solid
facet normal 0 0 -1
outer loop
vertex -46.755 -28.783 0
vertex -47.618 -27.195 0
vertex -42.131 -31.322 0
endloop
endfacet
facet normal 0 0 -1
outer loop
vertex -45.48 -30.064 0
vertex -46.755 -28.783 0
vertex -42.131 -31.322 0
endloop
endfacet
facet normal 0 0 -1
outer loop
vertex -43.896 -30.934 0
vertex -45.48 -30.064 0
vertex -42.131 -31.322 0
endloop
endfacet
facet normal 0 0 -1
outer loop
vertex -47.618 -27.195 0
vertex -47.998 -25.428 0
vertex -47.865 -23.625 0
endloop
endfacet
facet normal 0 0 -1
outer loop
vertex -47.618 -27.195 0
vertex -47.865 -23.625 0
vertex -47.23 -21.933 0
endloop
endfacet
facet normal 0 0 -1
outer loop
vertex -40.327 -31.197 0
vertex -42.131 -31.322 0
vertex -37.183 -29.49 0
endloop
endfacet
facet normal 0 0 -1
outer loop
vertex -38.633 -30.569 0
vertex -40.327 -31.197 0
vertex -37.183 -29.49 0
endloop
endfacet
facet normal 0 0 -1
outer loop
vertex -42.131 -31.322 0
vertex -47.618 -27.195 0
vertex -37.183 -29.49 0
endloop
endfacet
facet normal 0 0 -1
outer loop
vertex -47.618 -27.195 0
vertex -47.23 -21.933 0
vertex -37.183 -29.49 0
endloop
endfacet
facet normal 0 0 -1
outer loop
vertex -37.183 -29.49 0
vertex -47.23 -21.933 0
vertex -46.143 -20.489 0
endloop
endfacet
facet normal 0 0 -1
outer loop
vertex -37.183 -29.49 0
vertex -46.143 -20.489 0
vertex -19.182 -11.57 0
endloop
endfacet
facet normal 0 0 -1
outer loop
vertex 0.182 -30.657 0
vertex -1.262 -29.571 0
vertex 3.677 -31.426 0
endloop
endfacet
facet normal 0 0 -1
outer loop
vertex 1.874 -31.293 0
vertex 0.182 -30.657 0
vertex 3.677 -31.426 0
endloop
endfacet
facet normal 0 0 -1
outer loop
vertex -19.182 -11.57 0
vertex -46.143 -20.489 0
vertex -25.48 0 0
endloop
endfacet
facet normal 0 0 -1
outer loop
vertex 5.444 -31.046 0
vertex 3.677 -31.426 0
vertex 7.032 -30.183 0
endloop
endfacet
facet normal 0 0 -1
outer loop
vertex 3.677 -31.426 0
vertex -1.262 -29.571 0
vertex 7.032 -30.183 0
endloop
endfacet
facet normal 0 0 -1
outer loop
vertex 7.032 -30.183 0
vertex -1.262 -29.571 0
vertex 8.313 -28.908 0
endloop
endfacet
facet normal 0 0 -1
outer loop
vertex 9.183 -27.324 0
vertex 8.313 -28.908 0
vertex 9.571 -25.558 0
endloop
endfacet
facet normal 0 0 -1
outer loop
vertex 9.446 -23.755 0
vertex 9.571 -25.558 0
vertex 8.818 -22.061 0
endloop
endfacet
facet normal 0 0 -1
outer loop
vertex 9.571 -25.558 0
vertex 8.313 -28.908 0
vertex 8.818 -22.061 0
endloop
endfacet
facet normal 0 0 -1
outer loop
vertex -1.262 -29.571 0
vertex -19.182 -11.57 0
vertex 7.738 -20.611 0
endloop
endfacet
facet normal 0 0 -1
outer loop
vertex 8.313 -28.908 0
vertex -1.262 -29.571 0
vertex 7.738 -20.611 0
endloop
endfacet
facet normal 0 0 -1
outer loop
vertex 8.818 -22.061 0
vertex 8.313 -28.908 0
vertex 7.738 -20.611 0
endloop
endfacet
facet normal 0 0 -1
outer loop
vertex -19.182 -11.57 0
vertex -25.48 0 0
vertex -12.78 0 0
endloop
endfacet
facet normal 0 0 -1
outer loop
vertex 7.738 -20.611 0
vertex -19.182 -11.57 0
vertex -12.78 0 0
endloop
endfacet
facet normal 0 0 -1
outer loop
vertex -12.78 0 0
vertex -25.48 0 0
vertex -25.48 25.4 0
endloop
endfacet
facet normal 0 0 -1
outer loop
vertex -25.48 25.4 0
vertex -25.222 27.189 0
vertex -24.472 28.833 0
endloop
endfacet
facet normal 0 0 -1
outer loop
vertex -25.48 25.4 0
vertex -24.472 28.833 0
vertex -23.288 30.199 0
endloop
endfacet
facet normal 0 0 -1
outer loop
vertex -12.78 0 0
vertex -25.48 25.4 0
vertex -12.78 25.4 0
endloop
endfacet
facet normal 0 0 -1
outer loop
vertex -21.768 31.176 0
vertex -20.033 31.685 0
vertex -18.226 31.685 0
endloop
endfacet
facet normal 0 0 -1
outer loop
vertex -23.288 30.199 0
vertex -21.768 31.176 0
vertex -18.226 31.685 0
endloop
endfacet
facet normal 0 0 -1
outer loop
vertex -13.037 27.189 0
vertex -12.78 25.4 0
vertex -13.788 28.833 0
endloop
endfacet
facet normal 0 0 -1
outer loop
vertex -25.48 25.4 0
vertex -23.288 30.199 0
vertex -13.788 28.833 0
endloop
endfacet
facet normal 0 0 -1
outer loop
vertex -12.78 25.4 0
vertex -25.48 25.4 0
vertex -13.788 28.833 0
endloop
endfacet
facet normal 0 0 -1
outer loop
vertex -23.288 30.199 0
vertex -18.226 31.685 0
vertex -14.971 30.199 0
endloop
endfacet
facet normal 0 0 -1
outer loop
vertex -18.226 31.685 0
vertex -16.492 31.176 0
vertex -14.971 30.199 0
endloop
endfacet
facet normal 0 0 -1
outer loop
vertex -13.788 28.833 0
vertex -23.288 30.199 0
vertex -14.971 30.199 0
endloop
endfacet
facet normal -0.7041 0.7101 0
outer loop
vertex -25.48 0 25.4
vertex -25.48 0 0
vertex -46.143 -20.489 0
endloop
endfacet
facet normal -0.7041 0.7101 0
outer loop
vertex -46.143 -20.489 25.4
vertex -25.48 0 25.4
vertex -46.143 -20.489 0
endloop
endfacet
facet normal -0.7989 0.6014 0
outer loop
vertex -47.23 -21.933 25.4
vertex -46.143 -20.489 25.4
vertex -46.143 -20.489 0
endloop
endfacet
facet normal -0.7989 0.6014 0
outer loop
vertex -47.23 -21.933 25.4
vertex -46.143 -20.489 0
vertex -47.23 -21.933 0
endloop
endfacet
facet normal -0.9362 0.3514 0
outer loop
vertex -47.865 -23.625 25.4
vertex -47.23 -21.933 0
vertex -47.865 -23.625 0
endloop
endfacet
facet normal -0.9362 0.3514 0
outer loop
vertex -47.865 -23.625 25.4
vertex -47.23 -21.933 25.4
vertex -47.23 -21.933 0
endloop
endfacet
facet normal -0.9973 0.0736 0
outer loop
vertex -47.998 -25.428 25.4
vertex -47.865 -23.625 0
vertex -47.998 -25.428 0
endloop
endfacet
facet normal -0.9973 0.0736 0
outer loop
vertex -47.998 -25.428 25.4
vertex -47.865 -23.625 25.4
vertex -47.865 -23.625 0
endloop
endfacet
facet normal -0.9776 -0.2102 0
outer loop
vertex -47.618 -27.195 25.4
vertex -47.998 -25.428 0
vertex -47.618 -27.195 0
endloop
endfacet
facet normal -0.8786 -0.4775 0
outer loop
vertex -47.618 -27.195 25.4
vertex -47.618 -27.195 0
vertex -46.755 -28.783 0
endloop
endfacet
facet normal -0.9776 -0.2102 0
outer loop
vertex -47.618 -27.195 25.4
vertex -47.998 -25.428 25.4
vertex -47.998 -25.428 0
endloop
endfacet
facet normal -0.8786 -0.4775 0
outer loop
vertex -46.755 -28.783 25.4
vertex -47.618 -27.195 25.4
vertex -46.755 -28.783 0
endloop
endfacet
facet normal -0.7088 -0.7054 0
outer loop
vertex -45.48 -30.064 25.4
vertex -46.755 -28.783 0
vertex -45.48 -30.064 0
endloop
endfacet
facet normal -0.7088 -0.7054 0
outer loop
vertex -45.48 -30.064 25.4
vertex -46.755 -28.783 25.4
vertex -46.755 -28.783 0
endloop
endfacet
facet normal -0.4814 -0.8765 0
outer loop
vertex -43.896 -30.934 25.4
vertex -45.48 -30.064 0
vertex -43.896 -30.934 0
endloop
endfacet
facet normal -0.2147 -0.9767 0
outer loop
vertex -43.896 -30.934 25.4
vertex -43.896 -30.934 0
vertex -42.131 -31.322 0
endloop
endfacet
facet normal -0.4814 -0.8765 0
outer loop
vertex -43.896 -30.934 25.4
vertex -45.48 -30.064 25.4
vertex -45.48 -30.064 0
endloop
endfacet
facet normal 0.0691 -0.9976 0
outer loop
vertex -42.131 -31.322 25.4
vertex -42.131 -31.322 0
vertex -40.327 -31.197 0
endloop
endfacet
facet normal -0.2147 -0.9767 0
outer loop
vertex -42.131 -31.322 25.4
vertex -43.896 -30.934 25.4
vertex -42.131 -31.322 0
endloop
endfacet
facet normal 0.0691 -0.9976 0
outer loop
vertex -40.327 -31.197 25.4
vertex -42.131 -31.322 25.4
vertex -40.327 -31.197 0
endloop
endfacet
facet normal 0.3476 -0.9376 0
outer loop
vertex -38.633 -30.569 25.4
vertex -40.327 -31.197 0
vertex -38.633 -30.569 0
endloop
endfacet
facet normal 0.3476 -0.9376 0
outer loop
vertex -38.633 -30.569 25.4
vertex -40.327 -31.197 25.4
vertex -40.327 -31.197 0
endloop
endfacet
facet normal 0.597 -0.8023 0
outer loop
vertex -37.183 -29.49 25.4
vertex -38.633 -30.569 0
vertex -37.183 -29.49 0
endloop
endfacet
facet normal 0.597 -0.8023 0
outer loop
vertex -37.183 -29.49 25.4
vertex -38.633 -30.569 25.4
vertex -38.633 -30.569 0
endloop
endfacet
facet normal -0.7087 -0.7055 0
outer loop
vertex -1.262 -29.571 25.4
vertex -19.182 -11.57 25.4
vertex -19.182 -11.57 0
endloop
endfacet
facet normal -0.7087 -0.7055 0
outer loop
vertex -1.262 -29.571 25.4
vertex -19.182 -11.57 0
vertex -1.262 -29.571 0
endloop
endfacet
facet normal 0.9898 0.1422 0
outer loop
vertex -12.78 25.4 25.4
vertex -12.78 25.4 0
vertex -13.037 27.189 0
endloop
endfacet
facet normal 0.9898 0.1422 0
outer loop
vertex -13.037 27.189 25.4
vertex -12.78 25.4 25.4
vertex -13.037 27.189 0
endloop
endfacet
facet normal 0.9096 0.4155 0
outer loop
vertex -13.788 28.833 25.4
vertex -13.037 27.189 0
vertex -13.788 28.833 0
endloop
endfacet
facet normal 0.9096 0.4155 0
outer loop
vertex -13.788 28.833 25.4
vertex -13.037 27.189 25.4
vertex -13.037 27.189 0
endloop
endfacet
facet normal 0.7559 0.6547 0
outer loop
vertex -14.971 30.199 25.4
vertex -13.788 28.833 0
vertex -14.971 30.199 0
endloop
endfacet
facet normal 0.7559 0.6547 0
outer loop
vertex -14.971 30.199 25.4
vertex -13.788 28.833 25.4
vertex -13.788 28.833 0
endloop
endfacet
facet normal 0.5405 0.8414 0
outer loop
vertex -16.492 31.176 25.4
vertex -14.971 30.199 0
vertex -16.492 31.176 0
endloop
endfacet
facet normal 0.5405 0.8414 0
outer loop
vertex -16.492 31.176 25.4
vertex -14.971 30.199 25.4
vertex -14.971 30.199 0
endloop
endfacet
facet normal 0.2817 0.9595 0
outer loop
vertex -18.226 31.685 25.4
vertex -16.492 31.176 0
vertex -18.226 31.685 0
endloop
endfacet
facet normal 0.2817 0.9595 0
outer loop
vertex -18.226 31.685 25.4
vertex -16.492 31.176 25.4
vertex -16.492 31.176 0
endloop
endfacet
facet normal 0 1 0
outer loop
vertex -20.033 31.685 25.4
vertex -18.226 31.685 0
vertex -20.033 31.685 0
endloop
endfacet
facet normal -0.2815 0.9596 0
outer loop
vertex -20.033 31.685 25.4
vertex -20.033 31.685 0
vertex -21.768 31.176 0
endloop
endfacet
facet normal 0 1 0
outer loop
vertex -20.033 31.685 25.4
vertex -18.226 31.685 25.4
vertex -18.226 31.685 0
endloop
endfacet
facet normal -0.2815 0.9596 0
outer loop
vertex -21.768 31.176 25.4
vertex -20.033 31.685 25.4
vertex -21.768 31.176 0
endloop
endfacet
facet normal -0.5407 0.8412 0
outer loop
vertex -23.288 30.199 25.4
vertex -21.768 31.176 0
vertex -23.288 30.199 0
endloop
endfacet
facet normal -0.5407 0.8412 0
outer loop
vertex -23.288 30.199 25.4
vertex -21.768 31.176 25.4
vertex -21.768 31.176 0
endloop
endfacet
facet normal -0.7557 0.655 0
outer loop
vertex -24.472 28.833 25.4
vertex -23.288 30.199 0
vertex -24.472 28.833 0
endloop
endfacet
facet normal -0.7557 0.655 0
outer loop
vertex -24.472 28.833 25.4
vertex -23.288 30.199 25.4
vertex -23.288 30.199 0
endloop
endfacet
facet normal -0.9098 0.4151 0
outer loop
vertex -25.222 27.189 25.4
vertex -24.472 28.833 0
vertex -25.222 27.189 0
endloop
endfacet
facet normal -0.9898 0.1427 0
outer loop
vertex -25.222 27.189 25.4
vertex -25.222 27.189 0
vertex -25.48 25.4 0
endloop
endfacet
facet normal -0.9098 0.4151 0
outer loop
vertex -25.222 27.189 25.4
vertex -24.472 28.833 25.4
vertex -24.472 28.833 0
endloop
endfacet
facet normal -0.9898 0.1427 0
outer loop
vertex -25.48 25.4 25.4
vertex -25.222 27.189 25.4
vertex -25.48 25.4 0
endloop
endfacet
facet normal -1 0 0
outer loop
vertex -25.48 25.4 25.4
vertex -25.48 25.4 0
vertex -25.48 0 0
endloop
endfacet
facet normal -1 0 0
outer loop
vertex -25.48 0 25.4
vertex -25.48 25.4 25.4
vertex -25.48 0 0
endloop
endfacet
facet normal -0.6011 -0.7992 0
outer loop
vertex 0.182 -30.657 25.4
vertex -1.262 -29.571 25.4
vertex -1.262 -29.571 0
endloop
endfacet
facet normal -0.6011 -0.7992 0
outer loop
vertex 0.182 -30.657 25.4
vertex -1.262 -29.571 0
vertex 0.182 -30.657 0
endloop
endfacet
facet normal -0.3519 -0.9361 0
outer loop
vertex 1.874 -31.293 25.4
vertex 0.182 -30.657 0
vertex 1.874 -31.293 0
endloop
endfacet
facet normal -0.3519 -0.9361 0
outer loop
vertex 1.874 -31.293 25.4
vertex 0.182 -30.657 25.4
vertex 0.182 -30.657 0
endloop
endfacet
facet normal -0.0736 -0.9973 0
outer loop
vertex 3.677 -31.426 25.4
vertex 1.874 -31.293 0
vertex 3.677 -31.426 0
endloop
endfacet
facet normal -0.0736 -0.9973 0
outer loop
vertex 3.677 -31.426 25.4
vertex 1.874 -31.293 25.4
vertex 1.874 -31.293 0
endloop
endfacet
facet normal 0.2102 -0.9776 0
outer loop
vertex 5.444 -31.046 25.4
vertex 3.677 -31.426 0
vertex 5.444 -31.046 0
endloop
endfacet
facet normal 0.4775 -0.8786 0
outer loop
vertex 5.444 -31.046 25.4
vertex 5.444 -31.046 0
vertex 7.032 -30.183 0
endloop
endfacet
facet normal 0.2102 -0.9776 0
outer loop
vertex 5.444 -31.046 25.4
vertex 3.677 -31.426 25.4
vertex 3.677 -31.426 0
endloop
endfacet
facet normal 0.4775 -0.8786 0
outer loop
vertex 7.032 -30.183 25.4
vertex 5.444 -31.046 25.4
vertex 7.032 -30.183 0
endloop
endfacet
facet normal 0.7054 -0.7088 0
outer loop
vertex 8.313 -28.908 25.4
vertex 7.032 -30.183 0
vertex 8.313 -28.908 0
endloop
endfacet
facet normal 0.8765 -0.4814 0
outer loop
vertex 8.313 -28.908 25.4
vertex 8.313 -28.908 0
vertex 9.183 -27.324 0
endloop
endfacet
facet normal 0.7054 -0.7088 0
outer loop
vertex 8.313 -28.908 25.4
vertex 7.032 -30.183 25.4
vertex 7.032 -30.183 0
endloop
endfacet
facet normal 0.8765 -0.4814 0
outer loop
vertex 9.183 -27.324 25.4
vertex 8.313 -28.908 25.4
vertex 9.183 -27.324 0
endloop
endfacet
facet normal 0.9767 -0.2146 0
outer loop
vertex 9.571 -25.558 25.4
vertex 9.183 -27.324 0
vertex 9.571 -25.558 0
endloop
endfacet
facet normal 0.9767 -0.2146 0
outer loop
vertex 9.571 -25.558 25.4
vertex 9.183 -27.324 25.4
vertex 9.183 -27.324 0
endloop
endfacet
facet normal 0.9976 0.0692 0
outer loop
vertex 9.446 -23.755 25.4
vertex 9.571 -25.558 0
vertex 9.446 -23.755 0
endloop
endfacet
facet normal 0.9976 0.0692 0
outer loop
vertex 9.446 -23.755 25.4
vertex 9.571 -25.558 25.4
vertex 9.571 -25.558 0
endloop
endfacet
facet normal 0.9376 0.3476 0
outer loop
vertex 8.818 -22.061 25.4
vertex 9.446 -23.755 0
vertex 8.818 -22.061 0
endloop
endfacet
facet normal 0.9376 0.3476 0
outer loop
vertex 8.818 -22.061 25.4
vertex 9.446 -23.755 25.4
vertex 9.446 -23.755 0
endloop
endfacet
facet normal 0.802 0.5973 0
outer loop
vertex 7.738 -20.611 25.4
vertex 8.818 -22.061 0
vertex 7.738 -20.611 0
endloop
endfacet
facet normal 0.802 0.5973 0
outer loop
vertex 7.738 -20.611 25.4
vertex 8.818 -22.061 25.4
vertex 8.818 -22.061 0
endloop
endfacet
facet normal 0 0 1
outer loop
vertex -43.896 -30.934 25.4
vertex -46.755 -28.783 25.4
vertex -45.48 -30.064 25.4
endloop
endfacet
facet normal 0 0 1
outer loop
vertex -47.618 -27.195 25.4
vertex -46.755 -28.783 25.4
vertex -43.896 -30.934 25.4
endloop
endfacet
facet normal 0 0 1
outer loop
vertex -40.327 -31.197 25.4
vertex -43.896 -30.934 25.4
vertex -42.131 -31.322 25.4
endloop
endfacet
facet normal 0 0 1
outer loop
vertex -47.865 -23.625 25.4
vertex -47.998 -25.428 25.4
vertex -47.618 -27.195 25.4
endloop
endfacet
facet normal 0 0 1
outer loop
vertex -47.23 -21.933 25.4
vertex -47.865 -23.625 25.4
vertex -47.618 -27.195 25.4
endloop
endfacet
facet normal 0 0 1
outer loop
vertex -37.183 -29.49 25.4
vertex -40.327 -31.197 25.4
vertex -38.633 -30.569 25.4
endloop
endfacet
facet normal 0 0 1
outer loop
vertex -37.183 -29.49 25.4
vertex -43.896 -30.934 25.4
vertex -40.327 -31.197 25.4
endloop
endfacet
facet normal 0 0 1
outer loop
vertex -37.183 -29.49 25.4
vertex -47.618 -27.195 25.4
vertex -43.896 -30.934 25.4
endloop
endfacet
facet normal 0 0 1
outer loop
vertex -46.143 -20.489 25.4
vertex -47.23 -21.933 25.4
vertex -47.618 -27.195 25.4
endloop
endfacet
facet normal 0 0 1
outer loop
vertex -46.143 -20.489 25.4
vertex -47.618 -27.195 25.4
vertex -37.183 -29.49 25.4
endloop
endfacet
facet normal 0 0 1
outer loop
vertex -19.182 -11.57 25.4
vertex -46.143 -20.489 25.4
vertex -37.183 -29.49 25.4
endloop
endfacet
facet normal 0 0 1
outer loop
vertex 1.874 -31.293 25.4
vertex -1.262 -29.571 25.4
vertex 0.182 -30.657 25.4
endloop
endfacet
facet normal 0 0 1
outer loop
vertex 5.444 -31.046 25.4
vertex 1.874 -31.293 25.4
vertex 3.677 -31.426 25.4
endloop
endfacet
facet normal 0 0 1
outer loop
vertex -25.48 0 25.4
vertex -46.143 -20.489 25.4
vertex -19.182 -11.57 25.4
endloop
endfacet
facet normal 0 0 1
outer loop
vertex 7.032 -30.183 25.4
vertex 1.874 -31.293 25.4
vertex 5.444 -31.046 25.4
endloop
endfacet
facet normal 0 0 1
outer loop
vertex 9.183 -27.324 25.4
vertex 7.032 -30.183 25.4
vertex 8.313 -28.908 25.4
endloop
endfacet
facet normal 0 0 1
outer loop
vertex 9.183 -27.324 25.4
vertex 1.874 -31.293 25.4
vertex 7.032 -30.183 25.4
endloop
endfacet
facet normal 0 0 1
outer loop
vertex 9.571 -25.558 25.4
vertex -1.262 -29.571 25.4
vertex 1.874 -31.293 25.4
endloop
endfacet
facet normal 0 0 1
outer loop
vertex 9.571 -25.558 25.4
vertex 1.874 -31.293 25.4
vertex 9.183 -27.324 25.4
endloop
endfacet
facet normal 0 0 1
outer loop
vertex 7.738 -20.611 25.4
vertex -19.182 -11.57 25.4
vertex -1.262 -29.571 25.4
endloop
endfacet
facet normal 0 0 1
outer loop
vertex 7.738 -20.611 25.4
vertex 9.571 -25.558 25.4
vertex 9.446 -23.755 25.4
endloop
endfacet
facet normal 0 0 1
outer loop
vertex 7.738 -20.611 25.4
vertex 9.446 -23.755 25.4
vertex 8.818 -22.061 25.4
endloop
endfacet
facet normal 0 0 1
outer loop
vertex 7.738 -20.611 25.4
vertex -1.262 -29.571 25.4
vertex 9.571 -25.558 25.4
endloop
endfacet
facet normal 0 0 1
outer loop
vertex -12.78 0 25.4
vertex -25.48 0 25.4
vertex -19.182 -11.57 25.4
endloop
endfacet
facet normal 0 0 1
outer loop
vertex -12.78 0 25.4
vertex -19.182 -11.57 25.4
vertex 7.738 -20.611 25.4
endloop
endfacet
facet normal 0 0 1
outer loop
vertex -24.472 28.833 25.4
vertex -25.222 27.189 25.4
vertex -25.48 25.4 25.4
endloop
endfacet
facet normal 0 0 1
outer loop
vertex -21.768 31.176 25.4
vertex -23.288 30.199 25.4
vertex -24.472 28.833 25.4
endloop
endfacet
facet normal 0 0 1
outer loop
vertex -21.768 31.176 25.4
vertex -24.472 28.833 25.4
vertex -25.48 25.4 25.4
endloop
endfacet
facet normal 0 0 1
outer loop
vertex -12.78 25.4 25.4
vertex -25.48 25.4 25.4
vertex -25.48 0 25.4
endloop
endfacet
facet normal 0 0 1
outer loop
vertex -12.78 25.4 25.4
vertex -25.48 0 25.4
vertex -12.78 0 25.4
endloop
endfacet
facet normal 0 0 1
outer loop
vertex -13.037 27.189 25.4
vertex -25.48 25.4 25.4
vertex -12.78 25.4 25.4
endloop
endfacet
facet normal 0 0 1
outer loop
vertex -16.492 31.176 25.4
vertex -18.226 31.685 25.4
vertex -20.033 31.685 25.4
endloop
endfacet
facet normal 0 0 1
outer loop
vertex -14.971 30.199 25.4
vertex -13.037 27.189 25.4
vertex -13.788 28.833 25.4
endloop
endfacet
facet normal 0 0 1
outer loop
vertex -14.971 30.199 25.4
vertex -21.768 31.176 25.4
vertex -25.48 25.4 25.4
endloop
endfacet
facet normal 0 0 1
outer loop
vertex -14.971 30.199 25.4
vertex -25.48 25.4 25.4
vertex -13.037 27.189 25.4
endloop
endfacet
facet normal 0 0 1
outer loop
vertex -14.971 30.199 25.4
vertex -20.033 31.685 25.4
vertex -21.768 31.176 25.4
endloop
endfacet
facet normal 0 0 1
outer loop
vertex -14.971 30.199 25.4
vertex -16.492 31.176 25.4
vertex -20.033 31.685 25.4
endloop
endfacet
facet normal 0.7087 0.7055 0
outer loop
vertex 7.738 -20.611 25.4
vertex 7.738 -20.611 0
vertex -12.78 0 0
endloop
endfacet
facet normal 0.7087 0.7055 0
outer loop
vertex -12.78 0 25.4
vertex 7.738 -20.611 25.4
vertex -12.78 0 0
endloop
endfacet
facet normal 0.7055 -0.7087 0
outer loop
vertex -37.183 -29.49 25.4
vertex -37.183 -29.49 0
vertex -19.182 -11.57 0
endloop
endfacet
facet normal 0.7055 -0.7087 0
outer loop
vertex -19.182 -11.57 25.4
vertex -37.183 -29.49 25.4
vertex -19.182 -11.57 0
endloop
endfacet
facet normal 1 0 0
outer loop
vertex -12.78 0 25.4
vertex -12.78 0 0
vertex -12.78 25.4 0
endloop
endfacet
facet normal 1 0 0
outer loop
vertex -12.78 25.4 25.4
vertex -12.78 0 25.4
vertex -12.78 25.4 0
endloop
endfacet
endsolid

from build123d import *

# Parameters (mm, degrees)
F1_DEPTH = 25.4
F3_DEPTH = 25.4
F5_DEPTH = 114


# Not quite as in the source:
# - an extrude ends at something that could not be found from the text; its depth is read off the source's solid


with BuildPart() as f1:
    # F0 (on Top) → F1 (new body)
    with BuildSketch(Plane.XY):
        Polygon((-25.4796925148, 25.4), (-25.4796925148, 0), (-46.1431506129, -20.4890353627), (-37.1832725133, -29.489623368), (-19.1820965027, -11.569867169), (-1.2623403036, -29.5710431796), (7.7382477017, -20.61116508), (-12.7796925148, 0), (-12.7796925148, 25.4), align=None)
    extrude(amount=F1_DEPTH)

    # F2 (on face) → F3 (join)
    with BuildSketch(Plane.XY.offset(25.4)):
        with BuildLine():
            Line((-25.4796925148, 25.4), (-12.7796925148, 25.4))
            ThreePointArc((-12.7796925148, 25.4), (-19.1296925148, 31.75), (-25.4796925148, 25.4))
        make_face()
        with BuildLine():
            Line((7.7382477017, -20.61116508), (-1.2623403036, -29.5710431796))
            ThreePointArc((-1.2623403036, -29.5710431796), (7.7178927488, -29.5913981325), (7.7382477017, -20.61116508))
        make_face()
        with BuildLine():
            ThreePointArc((-46.1431506129, -20.4890353627), (-46.1635055657, -29.4692684152), (-37.1832725133, -29.489623368))
            Line((-37.1832725133, -29.489623368), (-46.1431506129, -20.4890353627))
        make_face()
    extrude(amount=-F3_DEPTH)

    # F4 (on face) → F5 (cut, through all)
    with BuildSketch(Plane.XY.offset(25.4)):
        with BuildLine():
            Line((-42.5259842963, -16.9024019821), (-40.6344192228, -15.0268038369))
            ThreePointArc((-40.6344192228, -15.0268038369), (-41.6786510297, -15.8653155428), (-42.5259842963, -16.9024019821))
        make_face()
        with BuildLine():
            ThreePointArc((-32.6380296989, -24.9649388112), (-31.2402342157, -22.88066907), (-30.7492439593, -20.4195837129))
            ThreePointArc((-30.7492439593, -20.4195837129), (-34.0912883888, -14.7893358325), (-40.6344192228, -15.0268038369))
            Line((-40.6344192228, -15.0268038369), (-42.5259842963, -16.9024019821))
            ThreePointArc((-42.5259842963, -16.9024019821), (-41.2158295319, -25.3902171382), (-32.6380296989, -24.9649388112))
        make_face()
        with BuildLine():
            ThreePointArc((3.3359301315, -18.6069775374), (2.8926555851, -16.371867323), (1.6299325028, -14.4750962741))
            ThreePointArc((1.6299325028, -14.4750962741), (-7.9341003982, -20.8420877519), (3.3359301315, -18.6069775374))
        make_face()
    extrude(amount=F5_DEPTH, mode=Mode.SUBTRACT)


solid = f1.part
